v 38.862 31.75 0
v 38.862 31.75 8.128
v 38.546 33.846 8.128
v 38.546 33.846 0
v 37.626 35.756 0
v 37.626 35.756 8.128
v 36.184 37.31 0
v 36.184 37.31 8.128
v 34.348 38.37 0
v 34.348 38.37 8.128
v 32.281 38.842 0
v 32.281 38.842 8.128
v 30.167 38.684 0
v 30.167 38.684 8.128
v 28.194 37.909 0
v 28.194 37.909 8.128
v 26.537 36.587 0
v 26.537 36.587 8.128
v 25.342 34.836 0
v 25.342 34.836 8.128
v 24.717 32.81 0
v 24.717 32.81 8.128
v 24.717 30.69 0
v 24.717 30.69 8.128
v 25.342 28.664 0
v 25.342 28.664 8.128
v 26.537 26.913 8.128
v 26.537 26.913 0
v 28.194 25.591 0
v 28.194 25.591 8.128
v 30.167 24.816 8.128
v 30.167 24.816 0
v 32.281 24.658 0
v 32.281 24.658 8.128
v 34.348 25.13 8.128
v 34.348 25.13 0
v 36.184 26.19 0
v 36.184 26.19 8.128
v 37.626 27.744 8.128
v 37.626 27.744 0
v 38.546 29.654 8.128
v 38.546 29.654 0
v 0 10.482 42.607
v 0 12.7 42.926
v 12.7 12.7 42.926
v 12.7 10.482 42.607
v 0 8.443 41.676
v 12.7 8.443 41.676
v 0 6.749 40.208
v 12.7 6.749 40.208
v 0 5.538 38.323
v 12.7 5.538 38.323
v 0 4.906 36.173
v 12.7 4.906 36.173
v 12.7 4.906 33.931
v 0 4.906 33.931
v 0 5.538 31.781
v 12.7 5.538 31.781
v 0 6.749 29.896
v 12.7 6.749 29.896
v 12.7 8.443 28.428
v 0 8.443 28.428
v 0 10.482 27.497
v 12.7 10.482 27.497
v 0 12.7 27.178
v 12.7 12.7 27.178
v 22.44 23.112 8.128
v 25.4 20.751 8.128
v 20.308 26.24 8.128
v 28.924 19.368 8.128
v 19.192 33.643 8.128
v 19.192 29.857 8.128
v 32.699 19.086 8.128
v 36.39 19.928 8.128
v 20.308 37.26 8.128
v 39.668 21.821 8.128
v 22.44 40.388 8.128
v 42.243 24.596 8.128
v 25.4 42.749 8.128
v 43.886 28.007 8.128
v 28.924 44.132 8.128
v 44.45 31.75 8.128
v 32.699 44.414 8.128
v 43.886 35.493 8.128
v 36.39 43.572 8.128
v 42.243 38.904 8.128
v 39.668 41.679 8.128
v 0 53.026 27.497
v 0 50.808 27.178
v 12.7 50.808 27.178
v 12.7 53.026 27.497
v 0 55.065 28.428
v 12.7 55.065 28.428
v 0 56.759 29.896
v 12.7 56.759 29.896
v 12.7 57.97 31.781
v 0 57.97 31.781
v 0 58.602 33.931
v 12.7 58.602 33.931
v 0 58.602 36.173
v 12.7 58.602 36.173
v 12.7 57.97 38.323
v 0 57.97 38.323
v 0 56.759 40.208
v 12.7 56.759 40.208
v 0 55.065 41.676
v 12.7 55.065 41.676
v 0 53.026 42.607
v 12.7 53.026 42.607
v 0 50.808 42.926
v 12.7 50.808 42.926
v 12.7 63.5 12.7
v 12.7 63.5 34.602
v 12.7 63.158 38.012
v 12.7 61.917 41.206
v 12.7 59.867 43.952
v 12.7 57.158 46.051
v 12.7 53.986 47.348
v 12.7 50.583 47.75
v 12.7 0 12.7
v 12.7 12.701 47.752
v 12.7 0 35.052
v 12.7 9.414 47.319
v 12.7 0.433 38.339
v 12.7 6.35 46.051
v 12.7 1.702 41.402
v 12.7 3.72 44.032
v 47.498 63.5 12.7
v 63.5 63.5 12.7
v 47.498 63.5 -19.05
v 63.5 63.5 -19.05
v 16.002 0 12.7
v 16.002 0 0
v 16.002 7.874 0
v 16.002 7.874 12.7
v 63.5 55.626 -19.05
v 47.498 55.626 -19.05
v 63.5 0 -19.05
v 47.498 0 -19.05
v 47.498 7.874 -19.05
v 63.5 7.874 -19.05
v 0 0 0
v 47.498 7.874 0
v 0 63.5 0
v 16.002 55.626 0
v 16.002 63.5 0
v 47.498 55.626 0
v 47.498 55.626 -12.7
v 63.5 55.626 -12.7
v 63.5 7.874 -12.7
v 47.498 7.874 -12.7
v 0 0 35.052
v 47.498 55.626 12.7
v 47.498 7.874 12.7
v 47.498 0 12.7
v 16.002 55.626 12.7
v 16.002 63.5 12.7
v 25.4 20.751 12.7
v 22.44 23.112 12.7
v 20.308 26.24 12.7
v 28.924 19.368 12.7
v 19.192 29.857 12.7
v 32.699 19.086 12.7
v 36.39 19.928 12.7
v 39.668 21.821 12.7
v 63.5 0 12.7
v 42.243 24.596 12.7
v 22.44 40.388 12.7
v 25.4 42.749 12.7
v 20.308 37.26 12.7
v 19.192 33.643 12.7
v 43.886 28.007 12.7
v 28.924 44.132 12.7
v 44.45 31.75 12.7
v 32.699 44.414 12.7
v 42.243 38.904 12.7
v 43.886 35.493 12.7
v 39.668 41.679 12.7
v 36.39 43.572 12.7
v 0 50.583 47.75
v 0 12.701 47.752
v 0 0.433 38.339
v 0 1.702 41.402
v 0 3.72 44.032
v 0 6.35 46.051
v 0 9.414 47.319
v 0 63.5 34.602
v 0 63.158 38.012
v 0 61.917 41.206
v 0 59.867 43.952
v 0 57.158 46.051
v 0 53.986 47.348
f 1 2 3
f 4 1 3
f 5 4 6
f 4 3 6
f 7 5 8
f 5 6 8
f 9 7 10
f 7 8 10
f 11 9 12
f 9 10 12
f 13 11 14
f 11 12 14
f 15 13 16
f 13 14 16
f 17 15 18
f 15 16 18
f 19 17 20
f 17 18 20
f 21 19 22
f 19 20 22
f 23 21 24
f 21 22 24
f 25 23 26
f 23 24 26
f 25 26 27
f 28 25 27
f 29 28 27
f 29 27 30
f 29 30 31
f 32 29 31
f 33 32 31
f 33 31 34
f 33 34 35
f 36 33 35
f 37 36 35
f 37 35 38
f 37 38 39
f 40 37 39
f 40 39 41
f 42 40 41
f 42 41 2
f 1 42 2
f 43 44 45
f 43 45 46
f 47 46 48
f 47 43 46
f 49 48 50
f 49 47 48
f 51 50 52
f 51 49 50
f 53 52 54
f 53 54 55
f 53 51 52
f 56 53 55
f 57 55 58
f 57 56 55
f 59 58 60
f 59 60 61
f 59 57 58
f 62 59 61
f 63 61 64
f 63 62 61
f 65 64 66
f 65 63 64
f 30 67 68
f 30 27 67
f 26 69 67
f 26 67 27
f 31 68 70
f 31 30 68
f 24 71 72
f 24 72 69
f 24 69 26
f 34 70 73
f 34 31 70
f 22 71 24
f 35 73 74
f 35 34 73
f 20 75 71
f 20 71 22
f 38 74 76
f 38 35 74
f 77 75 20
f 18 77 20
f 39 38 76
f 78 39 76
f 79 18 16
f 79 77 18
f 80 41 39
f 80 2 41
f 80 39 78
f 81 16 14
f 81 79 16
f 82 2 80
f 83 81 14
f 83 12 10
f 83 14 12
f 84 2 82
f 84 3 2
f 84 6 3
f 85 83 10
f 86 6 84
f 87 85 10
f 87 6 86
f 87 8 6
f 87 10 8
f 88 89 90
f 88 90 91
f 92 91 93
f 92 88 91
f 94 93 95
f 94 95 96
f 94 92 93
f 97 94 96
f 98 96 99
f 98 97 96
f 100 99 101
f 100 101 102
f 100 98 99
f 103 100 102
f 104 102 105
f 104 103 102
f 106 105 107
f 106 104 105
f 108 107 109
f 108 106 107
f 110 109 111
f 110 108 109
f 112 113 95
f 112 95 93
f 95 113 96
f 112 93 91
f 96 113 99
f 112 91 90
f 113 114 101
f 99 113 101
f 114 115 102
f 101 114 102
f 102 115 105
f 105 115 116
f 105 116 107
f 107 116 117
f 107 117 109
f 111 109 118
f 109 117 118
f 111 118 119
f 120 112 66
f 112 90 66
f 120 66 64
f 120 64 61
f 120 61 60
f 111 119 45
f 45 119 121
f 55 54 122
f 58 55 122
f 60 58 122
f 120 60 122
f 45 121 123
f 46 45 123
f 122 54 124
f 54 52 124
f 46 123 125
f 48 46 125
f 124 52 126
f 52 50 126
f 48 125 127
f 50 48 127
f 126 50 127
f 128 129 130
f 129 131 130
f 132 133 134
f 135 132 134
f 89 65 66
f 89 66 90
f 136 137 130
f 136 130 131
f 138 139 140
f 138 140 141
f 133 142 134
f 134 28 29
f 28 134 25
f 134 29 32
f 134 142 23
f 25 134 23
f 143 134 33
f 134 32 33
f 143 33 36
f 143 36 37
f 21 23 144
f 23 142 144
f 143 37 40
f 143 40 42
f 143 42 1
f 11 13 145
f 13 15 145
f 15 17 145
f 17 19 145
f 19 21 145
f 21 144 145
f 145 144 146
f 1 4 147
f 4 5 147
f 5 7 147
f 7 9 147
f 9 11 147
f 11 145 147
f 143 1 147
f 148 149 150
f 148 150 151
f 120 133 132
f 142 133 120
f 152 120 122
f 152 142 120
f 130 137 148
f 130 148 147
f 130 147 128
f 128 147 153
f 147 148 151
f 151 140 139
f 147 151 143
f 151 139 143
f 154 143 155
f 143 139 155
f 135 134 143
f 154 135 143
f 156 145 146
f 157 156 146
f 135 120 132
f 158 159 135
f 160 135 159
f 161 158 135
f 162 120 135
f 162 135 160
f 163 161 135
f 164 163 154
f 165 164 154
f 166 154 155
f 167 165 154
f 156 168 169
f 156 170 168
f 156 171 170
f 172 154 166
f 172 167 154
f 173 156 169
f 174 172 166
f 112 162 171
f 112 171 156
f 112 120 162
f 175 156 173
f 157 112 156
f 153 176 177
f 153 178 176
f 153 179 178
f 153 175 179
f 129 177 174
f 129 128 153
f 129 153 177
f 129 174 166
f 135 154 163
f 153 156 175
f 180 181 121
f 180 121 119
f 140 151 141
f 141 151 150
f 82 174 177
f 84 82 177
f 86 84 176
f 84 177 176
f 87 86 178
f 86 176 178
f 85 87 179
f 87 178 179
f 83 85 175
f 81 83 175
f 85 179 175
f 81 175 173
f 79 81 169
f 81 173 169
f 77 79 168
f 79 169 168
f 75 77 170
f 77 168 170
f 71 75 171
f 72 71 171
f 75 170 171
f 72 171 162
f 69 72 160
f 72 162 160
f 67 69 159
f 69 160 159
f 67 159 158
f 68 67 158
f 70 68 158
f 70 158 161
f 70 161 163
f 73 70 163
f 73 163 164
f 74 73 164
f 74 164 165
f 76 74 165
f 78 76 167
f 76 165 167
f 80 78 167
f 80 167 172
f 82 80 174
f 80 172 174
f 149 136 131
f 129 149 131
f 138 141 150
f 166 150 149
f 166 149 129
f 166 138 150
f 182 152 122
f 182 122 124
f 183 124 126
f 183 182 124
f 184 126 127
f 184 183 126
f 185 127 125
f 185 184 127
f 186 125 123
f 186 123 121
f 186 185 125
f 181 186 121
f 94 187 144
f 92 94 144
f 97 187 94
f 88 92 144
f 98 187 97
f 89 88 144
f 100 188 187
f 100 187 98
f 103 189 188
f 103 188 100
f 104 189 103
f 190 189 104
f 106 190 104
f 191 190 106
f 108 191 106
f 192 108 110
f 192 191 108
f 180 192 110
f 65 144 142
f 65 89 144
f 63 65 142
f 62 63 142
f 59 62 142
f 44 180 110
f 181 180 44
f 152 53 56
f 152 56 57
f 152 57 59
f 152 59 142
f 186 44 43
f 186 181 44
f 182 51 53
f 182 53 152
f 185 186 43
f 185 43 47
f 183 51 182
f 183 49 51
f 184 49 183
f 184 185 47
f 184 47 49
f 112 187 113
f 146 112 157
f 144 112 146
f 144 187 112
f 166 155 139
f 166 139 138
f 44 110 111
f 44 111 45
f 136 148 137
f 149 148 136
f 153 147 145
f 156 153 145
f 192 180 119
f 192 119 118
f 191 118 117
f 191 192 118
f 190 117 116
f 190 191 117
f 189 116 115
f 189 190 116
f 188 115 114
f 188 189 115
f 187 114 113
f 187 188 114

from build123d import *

# Parameters (mm, degrees)
F1_DEPTH  = 12.7
F2_R      = 7.112
F3_DEPTH  = 12.701
F4_R      = 12.7
F5_DEPTH  = 4.572
F7_DEPTH  = 12.7
F8_W      = 16.002
F8_H      = 7.874
F9_DEPTH  = 19.05
F10_W     = 16.002
F10_H     = 12.7
F11_DEPTH = 47.752


with BuildPart() as f1:
    # F0 (on Top) → F1 (new body)
    with BuildSketch(Plane.XY):
        Polygon((0, 63.5), (0, 0), (16.002, 0), (16.002, 7.874), (47.498, 7.874), (47.498, 0), (63.5, 0), (63.5, 63.5), (47.498, 63.5), (47.498, 55.626), (16.002, 55.626), (16.002, 63.5), align=None)
    extrude(amount=F1_DEPTH)

    # F2 (on face) → F3 (cut, through all)
    with BuildSketch(Plane.XY.offset(12.7)):
        with Locations((31.75, 31.75)):
            Circle(F2_R)
    extrude(amount=-F3_DEPTH, mode=Mode.SUBTRACT)

    # F4 (on face) → F5 (cut)
    with BuildSketch(Plane.XY.offset(12.7)):
        with Locations((31.75, 31.75)):
            Circle(F4_R)
    extrude(amount=-F5_DEPTH, mode=Mode.SUBTRACT)

    # F6 (on face) → F7 (join)
    with BuildSketch(Plane(origin=(0, 0, 0), x_dir=(0, -1, 0), z_dir=(-1, 0, 0))):
        with BuildLine():
            ThreePointArc((-50.582985, 47.750007), (-59.867423, 43.952356), (-63.5, 34.602097))
            Line((-63.5, 34.602097), (-63.5, 12.7))
            Line((-63.5, 12.7), (0, 12.7))
            Line((0, 12.7), (0, 35.052))
            ThreePointArc((0, 35.052), (-3.71998, 44.032492), (-12.700668, 47.752))
            Line((-12.700668, 47.752), (-50.582985, 47.750007))
        make_face()
        with BuildLine():
            ThreePointArc((-12.7, 42.926), (-4.826, 35.052), (-12.7, 27.178))
            Line((-12.7, 27.178), (-50.807972, 27.178))
            ThreePointArc((-50.807972, 27.178), (-58.681972, 35.052), (-50.807972, 42.926))
            Line((-50.807972, 42.926), (-12.7, 42.926))
        make_face(mode=Mode.SUBTRACT)
    extrude(amount=-F7_DEPTH)

    # F8 (on face) → F9 (join)
    with BuildSketch(Plane(origin=(0, 0, 0), x_dir=(1, 0, 0), z_dir=(0, 0, -1))):
        with Locations((55.499, -3.937)):
            Rectangle(F8_W, F8_H)
        with Locations((55.499, -59.563)):
            Rectangle(F8_W, F8_H)
    extrude(amount=F9_DEPTH)

    # F10 (on face) → F11 (join, through all)
    with BuildSketch(Plane(origin=(0, 7.874, 0), x_dir=(-1, 0, 0), z_dir=(0, 1, 0))):
        with Locations((-55.499, -6.35)):
            Rectangle(F10_W, F10_H)
    extrude(amount=F11_DEPTH)


solid = f1.part
